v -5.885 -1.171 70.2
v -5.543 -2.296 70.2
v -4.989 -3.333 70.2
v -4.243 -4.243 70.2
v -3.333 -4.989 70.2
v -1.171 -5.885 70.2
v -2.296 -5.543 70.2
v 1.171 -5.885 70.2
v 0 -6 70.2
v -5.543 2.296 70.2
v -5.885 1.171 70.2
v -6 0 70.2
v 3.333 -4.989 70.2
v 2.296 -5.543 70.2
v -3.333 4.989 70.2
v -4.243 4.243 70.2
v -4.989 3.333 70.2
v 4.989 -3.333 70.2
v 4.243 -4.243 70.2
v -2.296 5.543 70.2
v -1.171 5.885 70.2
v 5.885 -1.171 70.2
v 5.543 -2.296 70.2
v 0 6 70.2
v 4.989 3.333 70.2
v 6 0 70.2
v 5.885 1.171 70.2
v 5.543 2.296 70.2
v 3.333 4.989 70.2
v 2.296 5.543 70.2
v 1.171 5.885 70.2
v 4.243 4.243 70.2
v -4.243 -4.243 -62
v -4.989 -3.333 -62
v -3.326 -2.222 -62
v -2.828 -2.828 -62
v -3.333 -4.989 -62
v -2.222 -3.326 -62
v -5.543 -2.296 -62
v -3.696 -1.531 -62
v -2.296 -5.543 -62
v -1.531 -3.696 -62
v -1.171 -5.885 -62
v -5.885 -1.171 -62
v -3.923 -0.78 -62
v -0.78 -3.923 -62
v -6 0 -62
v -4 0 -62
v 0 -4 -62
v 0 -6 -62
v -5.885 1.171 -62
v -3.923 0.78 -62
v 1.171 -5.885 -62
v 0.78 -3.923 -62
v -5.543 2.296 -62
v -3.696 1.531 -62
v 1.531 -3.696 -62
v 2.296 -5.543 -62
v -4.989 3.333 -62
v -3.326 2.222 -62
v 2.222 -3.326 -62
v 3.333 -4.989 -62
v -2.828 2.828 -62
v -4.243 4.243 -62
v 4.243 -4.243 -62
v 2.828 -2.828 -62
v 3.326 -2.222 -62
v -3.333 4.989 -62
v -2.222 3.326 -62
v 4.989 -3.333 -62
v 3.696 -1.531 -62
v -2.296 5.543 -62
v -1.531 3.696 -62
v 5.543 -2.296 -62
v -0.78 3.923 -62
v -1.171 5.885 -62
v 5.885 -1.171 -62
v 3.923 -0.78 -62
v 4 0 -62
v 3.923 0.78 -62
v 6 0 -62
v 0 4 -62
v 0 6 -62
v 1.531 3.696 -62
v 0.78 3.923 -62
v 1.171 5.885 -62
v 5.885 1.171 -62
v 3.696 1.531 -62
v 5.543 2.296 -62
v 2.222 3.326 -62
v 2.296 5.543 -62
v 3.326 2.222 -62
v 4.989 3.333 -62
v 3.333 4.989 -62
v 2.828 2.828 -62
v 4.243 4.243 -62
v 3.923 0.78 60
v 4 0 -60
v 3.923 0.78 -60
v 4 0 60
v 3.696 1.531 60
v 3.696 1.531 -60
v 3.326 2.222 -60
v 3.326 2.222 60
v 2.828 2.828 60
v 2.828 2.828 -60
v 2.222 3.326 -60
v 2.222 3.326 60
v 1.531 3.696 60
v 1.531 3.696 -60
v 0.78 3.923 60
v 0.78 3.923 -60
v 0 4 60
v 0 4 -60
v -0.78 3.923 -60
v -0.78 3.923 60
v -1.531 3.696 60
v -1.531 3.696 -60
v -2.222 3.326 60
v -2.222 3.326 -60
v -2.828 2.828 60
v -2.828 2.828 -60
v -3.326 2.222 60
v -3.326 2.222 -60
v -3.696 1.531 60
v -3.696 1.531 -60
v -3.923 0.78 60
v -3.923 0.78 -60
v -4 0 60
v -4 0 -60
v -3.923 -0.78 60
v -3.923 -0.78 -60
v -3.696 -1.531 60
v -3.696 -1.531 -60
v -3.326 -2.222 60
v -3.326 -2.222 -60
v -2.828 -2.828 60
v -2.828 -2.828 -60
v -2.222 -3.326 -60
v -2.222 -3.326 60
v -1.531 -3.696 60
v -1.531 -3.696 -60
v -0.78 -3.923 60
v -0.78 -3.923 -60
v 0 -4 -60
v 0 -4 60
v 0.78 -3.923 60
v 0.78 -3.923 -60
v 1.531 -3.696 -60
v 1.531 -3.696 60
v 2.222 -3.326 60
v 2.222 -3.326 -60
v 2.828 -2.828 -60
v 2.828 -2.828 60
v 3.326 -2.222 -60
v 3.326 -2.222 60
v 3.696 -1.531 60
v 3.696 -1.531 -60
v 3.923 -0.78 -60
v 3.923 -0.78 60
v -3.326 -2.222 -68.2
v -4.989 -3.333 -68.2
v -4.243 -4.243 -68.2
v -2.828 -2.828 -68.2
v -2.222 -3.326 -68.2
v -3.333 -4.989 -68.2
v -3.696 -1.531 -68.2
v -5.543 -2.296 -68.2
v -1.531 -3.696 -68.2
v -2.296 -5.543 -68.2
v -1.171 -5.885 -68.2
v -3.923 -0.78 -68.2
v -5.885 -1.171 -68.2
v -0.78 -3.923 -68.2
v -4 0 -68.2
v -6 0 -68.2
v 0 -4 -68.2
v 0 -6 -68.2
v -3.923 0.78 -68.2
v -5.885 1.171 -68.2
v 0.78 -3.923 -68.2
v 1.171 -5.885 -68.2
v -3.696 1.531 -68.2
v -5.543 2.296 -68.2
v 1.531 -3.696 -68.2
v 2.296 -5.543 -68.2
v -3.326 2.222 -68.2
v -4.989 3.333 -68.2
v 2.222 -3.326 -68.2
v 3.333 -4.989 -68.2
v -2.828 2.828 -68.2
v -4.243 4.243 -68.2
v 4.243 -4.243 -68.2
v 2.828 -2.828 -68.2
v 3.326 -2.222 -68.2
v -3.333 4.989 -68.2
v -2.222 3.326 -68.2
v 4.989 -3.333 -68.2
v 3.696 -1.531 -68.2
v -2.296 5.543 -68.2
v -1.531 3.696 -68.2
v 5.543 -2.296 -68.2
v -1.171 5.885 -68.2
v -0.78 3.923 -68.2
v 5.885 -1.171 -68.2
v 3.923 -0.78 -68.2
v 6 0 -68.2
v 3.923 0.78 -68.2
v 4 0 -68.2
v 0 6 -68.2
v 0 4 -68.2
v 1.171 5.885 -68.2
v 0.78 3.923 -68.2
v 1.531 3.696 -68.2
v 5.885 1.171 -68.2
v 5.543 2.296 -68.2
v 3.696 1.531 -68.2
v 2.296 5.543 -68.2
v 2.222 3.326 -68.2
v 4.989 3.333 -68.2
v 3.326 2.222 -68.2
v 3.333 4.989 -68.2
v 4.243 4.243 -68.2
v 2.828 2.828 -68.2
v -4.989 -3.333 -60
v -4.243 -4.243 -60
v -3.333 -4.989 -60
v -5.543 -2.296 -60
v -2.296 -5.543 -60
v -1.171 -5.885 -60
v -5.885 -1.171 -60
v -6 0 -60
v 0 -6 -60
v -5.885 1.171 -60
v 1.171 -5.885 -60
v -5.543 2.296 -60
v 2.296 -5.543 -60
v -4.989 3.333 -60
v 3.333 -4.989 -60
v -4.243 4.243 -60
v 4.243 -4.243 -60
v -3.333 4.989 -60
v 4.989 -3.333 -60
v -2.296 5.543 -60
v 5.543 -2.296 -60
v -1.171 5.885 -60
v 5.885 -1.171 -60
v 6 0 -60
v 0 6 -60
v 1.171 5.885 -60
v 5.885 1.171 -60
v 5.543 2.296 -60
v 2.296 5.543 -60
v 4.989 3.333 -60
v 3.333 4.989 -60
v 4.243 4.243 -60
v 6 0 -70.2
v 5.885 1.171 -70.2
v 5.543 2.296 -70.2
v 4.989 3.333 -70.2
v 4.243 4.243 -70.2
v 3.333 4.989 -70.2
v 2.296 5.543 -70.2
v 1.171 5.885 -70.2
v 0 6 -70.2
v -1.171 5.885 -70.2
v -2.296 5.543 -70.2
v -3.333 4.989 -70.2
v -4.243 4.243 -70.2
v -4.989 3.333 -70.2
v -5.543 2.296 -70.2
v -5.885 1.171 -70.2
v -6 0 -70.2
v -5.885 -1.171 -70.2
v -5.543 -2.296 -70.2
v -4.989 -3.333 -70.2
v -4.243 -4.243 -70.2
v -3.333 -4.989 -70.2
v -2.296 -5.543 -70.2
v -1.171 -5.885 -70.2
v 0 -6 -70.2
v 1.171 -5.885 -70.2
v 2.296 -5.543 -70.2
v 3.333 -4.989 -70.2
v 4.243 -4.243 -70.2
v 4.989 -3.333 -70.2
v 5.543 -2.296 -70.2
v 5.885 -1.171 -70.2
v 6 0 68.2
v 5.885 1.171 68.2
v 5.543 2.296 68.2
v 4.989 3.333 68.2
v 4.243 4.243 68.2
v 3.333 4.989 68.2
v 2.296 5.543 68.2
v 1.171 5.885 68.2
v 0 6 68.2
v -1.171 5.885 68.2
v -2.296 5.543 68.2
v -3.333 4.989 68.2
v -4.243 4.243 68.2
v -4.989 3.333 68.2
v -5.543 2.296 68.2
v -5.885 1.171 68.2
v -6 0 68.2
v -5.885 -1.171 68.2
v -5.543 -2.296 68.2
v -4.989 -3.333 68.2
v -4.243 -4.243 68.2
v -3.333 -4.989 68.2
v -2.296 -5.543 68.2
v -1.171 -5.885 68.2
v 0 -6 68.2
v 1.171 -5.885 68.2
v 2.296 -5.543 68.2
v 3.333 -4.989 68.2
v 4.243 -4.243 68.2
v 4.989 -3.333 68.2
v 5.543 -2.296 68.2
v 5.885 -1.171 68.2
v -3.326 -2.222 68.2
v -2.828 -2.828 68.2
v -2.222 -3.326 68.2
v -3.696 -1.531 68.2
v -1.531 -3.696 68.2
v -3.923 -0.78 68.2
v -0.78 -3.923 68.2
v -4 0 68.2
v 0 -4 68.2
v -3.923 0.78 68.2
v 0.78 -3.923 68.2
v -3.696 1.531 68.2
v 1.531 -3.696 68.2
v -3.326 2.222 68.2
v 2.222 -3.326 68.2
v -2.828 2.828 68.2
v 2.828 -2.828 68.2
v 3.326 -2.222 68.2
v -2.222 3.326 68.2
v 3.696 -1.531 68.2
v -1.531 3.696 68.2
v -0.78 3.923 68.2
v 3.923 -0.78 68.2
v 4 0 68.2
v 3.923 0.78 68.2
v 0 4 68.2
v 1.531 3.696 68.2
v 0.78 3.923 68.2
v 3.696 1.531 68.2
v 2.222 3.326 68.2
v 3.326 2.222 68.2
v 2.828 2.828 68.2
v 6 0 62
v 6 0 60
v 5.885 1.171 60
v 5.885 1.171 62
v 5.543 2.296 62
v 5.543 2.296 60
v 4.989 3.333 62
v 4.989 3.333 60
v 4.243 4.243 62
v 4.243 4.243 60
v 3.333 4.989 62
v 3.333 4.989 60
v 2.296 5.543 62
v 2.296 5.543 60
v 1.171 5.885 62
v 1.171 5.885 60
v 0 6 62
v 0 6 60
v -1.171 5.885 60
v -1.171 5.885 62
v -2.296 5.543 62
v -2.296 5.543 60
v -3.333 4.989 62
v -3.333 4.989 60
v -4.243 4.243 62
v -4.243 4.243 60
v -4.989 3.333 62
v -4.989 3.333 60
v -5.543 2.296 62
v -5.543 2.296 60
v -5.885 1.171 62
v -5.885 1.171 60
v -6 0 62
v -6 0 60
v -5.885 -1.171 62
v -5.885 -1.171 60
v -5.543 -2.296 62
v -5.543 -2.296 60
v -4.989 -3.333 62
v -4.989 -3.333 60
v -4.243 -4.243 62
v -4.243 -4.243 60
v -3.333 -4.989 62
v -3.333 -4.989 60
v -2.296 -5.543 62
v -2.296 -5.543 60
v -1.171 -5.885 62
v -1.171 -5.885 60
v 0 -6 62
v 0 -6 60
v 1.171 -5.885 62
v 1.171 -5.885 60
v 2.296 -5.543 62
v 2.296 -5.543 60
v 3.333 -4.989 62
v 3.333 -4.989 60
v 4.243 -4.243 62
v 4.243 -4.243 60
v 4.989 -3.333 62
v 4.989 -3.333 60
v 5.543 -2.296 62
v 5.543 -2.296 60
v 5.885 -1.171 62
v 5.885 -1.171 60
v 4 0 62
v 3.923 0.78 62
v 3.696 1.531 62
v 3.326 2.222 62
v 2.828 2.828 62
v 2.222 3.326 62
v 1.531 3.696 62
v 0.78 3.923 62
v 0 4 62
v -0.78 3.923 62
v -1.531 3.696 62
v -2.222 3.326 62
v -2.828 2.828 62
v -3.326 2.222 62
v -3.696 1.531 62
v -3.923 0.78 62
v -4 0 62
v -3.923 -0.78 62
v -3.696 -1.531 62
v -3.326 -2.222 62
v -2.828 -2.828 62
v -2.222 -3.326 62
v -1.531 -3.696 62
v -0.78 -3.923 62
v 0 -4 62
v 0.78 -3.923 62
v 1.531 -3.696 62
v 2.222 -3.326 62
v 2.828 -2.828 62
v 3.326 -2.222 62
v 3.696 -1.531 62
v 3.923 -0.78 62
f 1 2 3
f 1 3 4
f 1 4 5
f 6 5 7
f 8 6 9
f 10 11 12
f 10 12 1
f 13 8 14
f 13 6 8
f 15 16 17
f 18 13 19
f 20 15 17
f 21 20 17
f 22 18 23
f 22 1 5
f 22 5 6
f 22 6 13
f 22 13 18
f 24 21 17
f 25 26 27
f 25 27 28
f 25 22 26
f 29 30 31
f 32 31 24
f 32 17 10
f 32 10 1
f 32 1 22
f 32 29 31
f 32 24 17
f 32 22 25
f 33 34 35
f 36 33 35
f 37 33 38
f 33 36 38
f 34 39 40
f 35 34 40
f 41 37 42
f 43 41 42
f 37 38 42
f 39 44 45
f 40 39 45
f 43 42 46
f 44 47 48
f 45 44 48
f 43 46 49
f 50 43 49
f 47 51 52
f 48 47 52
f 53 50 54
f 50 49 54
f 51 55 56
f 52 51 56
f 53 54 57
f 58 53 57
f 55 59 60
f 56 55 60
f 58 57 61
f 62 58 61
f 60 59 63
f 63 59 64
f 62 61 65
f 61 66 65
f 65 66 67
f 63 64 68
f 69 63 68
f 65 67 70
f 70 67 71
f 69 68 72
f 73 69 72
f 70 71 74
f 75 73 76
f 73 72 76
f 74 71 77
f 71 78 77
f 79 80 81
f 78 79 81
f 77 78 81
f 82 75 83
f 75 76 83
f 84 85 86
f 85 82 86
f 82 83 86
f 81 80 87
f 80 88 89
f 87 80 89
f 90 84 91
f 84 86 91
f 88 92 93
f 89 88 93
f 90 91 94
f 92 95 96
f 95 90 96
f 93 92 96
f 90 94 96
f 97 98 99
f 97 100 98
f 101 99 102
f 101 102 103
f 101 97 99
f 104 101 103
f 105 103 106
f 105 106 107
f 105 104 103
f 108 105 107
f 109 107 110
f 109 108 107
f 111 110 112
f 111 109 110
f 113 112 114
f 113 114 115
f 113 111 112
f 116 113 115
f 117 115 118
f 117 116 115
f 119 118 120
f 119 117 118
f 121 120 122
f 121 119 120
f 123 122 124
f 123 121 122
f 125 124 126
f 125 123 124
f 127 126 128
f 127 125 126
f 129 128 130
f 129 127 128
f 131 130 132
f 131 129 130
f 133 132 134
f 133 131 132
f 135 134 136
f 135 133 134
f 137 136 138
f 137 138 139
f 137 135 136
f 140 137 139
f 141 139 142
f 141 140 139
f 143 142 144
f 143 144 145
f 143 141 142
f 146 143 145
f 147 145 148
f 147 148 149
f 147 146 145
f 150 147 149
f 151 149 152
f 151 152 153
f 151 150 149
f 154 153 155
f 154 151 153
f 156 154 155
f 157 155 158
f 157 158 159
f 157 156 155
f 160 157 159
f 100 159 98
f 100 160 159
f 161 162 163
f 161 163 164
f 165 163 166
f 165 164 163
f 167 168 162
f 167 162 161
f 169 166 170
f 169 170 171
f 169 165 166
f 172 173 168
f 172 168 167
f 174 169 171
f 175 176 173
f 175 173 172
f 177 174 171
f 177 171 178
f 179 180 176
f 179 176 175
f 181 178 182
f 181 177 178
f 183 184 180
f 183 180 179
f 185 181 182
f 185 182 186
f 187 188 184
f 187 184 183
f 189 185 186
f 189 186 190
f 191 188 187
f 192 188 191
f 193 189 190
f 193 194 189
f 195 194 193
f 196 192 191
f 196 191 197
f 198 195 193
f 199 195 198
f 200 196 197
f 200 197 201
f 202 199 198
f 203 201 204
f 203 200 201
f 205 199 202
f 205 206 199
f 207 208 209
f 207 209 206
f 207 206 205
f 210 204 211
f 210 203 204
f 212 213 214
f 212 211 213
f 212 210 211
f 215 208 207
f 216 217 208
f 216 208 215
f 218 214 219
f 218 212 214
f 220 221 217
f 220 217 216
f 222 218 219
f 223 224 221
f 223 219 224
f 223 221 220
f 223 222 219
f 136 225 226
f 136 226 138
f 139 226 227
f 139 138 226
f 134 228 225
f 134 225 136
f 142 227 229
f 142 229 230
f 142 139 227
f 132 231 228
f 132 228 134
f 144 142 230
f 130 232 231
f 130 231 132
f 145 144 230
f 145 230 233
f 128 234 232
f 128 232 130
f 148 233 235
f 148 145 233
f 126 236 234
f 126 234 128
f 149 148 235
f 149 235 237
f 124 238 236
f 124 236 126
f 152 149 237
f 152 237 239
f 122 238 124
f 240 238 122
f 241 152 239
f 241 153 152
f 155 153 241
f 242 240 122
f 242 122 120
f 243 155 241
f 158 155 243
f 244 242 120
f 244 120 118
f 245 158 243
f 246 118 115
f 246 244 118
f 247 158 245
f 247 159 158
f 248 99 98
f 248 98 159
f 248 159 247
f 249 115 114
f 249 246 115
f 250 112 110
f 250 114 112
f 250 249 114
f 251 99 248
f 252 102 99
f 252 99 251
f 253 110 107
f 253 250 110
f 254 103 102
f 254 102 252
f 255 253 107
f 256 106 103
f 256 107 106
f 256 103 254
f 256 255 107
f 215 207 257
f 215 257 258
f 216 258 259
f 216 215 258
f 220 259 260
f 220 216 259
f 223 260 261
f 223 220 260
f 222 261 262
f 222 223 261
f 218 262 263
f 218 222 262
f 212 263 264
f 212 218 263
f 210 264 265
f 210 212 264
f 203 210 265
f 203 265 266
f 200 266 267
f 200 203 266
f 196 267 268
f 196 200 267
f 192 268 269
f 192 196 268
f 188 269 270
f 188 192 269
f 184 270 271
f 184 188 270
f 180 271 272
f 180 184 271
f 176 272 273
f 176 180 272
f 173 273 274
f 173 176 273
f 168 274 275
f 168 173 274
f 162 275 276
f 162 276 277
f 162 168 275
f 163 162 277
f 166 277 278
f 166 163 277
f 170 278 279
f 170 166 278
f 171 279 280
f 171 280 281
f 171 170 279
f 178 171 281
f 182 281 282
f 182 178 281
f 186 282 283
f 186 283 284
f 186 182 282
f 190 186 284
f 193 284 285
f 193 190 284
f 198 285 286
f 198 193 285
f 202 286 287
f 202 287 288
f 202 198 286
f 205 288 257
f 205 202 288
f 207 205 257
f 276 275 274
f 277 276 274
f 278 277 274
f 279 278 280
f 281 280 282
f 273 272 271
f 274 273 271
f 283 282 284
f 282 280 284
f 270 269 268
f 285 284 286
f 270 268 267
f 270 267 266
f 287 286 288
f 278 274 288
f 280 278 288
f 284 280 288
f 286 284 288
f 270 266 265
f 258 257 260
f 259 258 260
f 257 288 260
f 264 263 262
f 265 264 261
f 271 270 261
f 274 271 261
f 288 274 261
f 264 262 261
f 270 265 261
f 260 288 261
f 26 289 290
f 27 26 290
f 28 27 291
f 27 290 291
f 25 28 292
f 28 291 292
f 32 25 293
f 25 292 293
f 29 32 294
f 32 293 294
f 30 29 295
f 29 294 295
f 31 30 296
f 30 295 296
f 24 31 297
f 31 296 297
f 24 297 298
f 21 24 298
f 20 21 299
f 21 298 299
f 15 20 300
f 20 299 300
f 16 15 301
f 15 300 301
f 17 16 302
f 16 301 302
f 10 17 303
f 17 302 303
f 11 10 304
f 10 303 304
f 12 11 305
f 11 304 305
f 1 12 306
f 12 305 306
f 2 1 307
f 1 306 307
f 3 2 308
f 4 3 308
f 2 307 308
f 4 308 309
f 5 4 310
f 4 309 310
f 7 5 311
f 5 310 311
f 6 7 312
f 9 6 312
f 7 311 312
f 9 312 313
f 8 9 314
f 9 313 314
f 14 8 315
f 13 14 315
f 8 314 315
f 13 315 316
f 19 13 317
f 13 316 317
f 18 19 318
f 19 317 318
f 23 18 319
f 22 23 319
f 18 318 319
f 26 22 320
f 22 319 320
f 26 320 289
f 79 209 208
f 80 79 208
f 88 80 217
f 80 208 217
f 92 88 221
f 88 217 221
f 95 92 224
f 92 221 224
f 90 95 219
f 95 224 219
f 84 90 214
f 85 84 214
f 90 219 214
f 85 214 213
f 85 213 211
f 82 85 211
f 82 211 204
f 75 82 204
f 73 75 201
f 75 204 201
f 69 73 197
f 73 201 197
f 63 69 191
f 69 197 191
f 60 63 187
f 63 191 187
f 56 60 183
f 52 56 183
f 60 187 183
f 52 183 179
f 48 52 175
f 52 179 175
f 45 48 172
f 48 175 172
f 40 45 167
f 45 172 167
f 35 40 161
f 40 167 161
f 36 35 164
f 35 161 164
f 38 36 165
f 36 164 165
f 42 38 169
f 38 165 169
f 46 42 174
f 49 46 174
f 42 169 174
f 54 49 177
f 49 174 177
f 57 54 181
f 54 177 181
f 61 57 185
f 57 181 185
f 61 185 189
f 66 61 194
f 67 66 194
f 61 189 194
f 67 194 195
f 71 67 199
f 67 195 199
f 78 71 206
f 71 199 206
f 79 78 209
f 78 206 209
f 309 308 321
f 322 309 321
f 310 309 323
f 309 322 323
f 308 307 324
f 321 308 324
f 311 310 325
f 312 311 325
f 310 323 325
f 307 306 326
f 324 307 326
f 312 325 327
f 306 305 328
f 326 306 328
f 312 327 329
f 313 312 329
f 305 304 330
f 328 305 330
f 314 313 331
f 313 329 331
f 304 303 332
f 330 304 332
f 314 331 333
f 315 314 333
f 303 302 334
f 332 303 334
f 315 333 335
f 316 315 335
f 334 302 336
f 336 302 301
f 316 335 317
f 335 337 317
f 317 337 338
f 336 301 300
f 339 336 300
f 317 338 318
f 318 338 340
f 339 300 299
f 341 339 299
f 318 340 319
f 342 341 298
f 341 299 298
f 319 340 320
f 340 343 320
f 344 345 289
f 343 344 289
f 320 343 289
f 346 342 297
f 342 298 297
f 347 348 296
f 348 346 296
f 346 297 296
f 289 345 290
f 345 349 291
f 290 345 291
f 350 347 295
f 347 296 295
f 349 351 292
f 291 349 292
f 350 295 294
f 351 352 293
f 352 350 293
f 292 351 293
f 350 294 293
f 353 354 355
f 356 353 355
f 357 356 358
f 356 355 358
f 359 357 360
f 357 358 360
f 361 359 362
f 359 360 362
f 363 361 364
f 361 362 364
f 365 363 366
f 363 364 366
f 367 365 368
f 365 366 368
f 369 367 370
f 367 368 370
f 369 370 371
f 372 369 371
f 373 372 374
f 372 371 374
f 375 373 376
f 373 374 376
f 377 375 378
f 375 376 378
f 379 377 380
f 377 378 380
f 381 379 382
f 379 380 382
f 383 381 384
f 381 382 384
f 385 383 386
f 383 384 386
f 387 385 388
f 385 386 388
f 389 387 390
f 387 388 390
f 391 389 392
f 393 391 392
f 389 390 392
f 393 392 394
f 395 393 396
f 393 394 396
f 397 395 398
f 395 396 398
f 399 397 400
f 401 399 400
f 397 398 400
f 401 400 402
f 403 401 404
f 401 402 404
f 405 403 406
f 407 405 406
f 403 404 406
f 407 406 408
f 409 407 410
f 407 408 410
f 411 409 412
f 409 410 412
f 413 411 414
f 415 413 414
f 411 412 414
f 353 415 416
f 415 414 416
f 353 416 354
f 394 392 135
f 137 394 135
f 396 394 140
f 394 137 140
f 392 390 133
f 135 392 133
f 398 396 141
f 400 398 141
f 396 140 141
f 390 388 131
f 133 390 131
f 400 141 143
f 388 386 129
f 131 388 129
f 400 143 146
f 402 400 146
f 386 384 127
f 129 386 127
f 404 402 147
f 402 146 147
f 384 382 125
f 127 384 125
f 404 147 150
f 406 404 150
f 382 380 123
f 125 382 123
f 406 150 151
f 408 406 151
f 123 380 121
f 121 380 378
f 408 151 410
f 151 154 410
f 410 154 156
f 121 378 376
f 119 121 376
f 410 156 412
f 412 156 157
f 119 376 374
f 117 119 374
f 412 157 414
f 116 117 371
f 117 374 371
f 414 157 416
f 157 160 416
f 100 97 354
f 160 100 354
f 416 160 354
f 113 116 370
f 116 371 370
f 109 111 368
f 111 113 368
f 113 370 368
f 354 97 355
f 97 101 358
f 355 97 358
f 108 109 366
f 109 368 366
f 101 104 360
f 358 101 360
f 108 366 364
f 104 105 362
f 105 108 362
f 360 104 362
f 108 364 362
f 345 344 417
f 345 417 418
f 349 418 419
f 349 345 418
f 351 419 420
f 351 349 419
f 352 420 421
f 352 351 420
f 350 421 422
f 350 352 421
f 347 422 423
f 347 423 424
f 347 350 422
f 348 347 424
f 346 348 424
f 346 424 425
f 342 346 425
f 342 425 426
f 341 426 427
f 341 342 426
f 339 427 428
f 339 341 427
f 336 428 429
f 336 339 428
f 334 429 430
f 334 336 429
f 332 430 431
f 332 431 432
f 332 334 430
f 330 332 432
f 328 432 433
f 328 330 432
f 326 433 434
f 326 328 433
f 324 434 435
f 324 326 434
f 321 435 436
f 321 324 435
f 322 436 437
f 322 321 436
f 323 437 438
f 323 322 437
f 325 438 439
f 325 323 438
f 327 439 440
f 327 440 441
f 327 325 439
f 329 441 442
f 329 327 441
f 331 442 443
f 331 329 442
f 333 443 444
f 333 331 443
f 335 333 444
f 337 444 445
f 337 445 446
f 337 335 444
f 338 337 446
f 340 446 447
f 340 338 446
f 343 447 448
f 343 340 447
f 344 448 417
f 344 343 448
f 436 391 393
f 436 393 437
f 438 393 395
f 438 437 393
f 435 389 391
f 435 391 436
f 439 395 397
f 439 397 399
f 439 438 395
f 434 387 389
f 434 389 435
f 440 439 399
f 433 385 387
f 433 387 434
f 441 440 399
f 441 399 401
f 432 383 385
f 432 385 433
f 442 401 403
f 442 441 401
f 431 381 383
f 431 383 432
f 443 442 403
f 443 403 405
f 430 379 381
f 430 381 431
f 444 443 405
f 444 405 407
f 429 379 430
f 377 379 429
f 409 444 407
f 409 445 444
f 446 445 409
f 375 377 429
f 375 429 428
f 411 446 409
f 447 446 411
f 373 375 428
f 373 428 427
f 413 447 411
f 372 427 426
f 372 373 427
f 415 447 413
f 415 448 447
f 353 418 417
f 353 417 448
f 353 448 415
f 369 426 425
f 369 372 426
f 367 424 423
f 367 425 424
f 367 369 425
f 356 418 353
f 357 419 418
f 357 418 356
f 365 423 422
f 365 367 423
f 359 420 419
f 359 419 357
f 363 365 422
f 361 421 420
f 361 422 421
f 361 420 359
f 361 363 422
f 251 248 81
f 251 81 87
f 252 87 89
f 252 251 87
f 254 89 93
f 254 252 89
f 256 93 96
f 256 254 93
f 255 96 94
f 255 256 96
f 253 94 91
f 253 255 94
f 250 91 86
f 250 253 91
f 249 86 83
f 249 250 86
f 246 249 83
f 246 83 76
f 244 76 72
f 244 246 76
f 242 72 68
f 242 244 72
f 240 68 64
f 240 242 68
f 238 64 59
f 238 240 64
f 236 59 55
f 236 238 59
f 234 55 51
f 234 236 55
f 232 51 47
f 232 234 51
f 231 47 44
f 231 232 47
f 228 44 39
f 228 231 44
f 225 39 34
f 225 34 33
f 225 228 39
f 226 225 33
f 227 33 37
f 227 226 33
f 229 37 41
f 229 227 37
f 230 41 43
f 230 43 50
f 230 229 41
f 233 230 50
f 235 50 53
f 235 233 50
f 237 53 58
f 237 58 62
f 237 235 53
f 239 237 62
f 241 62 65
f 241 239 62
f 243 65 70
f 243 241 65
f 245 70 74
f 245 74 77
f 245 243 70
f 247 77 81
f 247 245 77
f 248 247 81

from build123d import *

# Parameters (mm, degrees)
SKETCH_1_R      = 4
EXTRUDE_1_DEPTH = 60
SKETCH_2_R      = 6
EXTRUDE_2_DEPTH = 2
EXTRUDE_START   = 6.2
SKETCH_3_R      = 4
EXTRUDE_3_DEPTH = 6.2
SKETCH_4_R      = 6
EXTRUDE_4_DEPTH = 2


with BuildPart() as part:
    # Эскиз1 → Бобышка-Вытянуть1 (new, symmetric)
    with BuildSketch(Plane.XY):
        Circle(SKETCH_1_R)
    extrude(amount=EXTRUDE_1_DEPTH, both=True)

    # Эскиз2 → Бобышка-Вытянуть2 (add)
    with BuildSketch(Plane.XY.offset(60)):
        Circle(SKETCH_2_R)
    extrude_2 = extrude(amount=EXTRUDE_2_DEPTH)

    # Эскиз3 → Бобышка-Вытянуть3 (add)
    with BuildSketch(Plane.XY.offset(62).offset(EXTRUDE_START)):
        Circle(SKETCH_3_R)
    extrude_3 = extrude(amount=-EXTRUDE_3_DEPTH)

    # Эскиз4 → Бобышка-Вытянуть4 (add)
    with BuildSketch(Plane.XY.offset(68.2)):
        Circle(SKETCH_4_R)
    extrude_4 = extrude(amount=EXTRUDE_4_DEPTH)

    # Зеркальное отражение1: Бобышка-Вытянуть2, Бобышка-Вытянуть3, Бобышка-Вытянуть4 across plane
    add(extrude_2.mirror(Plane.XY))
    add(extrude_3.mirror(Plane.XY))
    add(extrude_4.mirror(Plane.XY))


solid = part.part
